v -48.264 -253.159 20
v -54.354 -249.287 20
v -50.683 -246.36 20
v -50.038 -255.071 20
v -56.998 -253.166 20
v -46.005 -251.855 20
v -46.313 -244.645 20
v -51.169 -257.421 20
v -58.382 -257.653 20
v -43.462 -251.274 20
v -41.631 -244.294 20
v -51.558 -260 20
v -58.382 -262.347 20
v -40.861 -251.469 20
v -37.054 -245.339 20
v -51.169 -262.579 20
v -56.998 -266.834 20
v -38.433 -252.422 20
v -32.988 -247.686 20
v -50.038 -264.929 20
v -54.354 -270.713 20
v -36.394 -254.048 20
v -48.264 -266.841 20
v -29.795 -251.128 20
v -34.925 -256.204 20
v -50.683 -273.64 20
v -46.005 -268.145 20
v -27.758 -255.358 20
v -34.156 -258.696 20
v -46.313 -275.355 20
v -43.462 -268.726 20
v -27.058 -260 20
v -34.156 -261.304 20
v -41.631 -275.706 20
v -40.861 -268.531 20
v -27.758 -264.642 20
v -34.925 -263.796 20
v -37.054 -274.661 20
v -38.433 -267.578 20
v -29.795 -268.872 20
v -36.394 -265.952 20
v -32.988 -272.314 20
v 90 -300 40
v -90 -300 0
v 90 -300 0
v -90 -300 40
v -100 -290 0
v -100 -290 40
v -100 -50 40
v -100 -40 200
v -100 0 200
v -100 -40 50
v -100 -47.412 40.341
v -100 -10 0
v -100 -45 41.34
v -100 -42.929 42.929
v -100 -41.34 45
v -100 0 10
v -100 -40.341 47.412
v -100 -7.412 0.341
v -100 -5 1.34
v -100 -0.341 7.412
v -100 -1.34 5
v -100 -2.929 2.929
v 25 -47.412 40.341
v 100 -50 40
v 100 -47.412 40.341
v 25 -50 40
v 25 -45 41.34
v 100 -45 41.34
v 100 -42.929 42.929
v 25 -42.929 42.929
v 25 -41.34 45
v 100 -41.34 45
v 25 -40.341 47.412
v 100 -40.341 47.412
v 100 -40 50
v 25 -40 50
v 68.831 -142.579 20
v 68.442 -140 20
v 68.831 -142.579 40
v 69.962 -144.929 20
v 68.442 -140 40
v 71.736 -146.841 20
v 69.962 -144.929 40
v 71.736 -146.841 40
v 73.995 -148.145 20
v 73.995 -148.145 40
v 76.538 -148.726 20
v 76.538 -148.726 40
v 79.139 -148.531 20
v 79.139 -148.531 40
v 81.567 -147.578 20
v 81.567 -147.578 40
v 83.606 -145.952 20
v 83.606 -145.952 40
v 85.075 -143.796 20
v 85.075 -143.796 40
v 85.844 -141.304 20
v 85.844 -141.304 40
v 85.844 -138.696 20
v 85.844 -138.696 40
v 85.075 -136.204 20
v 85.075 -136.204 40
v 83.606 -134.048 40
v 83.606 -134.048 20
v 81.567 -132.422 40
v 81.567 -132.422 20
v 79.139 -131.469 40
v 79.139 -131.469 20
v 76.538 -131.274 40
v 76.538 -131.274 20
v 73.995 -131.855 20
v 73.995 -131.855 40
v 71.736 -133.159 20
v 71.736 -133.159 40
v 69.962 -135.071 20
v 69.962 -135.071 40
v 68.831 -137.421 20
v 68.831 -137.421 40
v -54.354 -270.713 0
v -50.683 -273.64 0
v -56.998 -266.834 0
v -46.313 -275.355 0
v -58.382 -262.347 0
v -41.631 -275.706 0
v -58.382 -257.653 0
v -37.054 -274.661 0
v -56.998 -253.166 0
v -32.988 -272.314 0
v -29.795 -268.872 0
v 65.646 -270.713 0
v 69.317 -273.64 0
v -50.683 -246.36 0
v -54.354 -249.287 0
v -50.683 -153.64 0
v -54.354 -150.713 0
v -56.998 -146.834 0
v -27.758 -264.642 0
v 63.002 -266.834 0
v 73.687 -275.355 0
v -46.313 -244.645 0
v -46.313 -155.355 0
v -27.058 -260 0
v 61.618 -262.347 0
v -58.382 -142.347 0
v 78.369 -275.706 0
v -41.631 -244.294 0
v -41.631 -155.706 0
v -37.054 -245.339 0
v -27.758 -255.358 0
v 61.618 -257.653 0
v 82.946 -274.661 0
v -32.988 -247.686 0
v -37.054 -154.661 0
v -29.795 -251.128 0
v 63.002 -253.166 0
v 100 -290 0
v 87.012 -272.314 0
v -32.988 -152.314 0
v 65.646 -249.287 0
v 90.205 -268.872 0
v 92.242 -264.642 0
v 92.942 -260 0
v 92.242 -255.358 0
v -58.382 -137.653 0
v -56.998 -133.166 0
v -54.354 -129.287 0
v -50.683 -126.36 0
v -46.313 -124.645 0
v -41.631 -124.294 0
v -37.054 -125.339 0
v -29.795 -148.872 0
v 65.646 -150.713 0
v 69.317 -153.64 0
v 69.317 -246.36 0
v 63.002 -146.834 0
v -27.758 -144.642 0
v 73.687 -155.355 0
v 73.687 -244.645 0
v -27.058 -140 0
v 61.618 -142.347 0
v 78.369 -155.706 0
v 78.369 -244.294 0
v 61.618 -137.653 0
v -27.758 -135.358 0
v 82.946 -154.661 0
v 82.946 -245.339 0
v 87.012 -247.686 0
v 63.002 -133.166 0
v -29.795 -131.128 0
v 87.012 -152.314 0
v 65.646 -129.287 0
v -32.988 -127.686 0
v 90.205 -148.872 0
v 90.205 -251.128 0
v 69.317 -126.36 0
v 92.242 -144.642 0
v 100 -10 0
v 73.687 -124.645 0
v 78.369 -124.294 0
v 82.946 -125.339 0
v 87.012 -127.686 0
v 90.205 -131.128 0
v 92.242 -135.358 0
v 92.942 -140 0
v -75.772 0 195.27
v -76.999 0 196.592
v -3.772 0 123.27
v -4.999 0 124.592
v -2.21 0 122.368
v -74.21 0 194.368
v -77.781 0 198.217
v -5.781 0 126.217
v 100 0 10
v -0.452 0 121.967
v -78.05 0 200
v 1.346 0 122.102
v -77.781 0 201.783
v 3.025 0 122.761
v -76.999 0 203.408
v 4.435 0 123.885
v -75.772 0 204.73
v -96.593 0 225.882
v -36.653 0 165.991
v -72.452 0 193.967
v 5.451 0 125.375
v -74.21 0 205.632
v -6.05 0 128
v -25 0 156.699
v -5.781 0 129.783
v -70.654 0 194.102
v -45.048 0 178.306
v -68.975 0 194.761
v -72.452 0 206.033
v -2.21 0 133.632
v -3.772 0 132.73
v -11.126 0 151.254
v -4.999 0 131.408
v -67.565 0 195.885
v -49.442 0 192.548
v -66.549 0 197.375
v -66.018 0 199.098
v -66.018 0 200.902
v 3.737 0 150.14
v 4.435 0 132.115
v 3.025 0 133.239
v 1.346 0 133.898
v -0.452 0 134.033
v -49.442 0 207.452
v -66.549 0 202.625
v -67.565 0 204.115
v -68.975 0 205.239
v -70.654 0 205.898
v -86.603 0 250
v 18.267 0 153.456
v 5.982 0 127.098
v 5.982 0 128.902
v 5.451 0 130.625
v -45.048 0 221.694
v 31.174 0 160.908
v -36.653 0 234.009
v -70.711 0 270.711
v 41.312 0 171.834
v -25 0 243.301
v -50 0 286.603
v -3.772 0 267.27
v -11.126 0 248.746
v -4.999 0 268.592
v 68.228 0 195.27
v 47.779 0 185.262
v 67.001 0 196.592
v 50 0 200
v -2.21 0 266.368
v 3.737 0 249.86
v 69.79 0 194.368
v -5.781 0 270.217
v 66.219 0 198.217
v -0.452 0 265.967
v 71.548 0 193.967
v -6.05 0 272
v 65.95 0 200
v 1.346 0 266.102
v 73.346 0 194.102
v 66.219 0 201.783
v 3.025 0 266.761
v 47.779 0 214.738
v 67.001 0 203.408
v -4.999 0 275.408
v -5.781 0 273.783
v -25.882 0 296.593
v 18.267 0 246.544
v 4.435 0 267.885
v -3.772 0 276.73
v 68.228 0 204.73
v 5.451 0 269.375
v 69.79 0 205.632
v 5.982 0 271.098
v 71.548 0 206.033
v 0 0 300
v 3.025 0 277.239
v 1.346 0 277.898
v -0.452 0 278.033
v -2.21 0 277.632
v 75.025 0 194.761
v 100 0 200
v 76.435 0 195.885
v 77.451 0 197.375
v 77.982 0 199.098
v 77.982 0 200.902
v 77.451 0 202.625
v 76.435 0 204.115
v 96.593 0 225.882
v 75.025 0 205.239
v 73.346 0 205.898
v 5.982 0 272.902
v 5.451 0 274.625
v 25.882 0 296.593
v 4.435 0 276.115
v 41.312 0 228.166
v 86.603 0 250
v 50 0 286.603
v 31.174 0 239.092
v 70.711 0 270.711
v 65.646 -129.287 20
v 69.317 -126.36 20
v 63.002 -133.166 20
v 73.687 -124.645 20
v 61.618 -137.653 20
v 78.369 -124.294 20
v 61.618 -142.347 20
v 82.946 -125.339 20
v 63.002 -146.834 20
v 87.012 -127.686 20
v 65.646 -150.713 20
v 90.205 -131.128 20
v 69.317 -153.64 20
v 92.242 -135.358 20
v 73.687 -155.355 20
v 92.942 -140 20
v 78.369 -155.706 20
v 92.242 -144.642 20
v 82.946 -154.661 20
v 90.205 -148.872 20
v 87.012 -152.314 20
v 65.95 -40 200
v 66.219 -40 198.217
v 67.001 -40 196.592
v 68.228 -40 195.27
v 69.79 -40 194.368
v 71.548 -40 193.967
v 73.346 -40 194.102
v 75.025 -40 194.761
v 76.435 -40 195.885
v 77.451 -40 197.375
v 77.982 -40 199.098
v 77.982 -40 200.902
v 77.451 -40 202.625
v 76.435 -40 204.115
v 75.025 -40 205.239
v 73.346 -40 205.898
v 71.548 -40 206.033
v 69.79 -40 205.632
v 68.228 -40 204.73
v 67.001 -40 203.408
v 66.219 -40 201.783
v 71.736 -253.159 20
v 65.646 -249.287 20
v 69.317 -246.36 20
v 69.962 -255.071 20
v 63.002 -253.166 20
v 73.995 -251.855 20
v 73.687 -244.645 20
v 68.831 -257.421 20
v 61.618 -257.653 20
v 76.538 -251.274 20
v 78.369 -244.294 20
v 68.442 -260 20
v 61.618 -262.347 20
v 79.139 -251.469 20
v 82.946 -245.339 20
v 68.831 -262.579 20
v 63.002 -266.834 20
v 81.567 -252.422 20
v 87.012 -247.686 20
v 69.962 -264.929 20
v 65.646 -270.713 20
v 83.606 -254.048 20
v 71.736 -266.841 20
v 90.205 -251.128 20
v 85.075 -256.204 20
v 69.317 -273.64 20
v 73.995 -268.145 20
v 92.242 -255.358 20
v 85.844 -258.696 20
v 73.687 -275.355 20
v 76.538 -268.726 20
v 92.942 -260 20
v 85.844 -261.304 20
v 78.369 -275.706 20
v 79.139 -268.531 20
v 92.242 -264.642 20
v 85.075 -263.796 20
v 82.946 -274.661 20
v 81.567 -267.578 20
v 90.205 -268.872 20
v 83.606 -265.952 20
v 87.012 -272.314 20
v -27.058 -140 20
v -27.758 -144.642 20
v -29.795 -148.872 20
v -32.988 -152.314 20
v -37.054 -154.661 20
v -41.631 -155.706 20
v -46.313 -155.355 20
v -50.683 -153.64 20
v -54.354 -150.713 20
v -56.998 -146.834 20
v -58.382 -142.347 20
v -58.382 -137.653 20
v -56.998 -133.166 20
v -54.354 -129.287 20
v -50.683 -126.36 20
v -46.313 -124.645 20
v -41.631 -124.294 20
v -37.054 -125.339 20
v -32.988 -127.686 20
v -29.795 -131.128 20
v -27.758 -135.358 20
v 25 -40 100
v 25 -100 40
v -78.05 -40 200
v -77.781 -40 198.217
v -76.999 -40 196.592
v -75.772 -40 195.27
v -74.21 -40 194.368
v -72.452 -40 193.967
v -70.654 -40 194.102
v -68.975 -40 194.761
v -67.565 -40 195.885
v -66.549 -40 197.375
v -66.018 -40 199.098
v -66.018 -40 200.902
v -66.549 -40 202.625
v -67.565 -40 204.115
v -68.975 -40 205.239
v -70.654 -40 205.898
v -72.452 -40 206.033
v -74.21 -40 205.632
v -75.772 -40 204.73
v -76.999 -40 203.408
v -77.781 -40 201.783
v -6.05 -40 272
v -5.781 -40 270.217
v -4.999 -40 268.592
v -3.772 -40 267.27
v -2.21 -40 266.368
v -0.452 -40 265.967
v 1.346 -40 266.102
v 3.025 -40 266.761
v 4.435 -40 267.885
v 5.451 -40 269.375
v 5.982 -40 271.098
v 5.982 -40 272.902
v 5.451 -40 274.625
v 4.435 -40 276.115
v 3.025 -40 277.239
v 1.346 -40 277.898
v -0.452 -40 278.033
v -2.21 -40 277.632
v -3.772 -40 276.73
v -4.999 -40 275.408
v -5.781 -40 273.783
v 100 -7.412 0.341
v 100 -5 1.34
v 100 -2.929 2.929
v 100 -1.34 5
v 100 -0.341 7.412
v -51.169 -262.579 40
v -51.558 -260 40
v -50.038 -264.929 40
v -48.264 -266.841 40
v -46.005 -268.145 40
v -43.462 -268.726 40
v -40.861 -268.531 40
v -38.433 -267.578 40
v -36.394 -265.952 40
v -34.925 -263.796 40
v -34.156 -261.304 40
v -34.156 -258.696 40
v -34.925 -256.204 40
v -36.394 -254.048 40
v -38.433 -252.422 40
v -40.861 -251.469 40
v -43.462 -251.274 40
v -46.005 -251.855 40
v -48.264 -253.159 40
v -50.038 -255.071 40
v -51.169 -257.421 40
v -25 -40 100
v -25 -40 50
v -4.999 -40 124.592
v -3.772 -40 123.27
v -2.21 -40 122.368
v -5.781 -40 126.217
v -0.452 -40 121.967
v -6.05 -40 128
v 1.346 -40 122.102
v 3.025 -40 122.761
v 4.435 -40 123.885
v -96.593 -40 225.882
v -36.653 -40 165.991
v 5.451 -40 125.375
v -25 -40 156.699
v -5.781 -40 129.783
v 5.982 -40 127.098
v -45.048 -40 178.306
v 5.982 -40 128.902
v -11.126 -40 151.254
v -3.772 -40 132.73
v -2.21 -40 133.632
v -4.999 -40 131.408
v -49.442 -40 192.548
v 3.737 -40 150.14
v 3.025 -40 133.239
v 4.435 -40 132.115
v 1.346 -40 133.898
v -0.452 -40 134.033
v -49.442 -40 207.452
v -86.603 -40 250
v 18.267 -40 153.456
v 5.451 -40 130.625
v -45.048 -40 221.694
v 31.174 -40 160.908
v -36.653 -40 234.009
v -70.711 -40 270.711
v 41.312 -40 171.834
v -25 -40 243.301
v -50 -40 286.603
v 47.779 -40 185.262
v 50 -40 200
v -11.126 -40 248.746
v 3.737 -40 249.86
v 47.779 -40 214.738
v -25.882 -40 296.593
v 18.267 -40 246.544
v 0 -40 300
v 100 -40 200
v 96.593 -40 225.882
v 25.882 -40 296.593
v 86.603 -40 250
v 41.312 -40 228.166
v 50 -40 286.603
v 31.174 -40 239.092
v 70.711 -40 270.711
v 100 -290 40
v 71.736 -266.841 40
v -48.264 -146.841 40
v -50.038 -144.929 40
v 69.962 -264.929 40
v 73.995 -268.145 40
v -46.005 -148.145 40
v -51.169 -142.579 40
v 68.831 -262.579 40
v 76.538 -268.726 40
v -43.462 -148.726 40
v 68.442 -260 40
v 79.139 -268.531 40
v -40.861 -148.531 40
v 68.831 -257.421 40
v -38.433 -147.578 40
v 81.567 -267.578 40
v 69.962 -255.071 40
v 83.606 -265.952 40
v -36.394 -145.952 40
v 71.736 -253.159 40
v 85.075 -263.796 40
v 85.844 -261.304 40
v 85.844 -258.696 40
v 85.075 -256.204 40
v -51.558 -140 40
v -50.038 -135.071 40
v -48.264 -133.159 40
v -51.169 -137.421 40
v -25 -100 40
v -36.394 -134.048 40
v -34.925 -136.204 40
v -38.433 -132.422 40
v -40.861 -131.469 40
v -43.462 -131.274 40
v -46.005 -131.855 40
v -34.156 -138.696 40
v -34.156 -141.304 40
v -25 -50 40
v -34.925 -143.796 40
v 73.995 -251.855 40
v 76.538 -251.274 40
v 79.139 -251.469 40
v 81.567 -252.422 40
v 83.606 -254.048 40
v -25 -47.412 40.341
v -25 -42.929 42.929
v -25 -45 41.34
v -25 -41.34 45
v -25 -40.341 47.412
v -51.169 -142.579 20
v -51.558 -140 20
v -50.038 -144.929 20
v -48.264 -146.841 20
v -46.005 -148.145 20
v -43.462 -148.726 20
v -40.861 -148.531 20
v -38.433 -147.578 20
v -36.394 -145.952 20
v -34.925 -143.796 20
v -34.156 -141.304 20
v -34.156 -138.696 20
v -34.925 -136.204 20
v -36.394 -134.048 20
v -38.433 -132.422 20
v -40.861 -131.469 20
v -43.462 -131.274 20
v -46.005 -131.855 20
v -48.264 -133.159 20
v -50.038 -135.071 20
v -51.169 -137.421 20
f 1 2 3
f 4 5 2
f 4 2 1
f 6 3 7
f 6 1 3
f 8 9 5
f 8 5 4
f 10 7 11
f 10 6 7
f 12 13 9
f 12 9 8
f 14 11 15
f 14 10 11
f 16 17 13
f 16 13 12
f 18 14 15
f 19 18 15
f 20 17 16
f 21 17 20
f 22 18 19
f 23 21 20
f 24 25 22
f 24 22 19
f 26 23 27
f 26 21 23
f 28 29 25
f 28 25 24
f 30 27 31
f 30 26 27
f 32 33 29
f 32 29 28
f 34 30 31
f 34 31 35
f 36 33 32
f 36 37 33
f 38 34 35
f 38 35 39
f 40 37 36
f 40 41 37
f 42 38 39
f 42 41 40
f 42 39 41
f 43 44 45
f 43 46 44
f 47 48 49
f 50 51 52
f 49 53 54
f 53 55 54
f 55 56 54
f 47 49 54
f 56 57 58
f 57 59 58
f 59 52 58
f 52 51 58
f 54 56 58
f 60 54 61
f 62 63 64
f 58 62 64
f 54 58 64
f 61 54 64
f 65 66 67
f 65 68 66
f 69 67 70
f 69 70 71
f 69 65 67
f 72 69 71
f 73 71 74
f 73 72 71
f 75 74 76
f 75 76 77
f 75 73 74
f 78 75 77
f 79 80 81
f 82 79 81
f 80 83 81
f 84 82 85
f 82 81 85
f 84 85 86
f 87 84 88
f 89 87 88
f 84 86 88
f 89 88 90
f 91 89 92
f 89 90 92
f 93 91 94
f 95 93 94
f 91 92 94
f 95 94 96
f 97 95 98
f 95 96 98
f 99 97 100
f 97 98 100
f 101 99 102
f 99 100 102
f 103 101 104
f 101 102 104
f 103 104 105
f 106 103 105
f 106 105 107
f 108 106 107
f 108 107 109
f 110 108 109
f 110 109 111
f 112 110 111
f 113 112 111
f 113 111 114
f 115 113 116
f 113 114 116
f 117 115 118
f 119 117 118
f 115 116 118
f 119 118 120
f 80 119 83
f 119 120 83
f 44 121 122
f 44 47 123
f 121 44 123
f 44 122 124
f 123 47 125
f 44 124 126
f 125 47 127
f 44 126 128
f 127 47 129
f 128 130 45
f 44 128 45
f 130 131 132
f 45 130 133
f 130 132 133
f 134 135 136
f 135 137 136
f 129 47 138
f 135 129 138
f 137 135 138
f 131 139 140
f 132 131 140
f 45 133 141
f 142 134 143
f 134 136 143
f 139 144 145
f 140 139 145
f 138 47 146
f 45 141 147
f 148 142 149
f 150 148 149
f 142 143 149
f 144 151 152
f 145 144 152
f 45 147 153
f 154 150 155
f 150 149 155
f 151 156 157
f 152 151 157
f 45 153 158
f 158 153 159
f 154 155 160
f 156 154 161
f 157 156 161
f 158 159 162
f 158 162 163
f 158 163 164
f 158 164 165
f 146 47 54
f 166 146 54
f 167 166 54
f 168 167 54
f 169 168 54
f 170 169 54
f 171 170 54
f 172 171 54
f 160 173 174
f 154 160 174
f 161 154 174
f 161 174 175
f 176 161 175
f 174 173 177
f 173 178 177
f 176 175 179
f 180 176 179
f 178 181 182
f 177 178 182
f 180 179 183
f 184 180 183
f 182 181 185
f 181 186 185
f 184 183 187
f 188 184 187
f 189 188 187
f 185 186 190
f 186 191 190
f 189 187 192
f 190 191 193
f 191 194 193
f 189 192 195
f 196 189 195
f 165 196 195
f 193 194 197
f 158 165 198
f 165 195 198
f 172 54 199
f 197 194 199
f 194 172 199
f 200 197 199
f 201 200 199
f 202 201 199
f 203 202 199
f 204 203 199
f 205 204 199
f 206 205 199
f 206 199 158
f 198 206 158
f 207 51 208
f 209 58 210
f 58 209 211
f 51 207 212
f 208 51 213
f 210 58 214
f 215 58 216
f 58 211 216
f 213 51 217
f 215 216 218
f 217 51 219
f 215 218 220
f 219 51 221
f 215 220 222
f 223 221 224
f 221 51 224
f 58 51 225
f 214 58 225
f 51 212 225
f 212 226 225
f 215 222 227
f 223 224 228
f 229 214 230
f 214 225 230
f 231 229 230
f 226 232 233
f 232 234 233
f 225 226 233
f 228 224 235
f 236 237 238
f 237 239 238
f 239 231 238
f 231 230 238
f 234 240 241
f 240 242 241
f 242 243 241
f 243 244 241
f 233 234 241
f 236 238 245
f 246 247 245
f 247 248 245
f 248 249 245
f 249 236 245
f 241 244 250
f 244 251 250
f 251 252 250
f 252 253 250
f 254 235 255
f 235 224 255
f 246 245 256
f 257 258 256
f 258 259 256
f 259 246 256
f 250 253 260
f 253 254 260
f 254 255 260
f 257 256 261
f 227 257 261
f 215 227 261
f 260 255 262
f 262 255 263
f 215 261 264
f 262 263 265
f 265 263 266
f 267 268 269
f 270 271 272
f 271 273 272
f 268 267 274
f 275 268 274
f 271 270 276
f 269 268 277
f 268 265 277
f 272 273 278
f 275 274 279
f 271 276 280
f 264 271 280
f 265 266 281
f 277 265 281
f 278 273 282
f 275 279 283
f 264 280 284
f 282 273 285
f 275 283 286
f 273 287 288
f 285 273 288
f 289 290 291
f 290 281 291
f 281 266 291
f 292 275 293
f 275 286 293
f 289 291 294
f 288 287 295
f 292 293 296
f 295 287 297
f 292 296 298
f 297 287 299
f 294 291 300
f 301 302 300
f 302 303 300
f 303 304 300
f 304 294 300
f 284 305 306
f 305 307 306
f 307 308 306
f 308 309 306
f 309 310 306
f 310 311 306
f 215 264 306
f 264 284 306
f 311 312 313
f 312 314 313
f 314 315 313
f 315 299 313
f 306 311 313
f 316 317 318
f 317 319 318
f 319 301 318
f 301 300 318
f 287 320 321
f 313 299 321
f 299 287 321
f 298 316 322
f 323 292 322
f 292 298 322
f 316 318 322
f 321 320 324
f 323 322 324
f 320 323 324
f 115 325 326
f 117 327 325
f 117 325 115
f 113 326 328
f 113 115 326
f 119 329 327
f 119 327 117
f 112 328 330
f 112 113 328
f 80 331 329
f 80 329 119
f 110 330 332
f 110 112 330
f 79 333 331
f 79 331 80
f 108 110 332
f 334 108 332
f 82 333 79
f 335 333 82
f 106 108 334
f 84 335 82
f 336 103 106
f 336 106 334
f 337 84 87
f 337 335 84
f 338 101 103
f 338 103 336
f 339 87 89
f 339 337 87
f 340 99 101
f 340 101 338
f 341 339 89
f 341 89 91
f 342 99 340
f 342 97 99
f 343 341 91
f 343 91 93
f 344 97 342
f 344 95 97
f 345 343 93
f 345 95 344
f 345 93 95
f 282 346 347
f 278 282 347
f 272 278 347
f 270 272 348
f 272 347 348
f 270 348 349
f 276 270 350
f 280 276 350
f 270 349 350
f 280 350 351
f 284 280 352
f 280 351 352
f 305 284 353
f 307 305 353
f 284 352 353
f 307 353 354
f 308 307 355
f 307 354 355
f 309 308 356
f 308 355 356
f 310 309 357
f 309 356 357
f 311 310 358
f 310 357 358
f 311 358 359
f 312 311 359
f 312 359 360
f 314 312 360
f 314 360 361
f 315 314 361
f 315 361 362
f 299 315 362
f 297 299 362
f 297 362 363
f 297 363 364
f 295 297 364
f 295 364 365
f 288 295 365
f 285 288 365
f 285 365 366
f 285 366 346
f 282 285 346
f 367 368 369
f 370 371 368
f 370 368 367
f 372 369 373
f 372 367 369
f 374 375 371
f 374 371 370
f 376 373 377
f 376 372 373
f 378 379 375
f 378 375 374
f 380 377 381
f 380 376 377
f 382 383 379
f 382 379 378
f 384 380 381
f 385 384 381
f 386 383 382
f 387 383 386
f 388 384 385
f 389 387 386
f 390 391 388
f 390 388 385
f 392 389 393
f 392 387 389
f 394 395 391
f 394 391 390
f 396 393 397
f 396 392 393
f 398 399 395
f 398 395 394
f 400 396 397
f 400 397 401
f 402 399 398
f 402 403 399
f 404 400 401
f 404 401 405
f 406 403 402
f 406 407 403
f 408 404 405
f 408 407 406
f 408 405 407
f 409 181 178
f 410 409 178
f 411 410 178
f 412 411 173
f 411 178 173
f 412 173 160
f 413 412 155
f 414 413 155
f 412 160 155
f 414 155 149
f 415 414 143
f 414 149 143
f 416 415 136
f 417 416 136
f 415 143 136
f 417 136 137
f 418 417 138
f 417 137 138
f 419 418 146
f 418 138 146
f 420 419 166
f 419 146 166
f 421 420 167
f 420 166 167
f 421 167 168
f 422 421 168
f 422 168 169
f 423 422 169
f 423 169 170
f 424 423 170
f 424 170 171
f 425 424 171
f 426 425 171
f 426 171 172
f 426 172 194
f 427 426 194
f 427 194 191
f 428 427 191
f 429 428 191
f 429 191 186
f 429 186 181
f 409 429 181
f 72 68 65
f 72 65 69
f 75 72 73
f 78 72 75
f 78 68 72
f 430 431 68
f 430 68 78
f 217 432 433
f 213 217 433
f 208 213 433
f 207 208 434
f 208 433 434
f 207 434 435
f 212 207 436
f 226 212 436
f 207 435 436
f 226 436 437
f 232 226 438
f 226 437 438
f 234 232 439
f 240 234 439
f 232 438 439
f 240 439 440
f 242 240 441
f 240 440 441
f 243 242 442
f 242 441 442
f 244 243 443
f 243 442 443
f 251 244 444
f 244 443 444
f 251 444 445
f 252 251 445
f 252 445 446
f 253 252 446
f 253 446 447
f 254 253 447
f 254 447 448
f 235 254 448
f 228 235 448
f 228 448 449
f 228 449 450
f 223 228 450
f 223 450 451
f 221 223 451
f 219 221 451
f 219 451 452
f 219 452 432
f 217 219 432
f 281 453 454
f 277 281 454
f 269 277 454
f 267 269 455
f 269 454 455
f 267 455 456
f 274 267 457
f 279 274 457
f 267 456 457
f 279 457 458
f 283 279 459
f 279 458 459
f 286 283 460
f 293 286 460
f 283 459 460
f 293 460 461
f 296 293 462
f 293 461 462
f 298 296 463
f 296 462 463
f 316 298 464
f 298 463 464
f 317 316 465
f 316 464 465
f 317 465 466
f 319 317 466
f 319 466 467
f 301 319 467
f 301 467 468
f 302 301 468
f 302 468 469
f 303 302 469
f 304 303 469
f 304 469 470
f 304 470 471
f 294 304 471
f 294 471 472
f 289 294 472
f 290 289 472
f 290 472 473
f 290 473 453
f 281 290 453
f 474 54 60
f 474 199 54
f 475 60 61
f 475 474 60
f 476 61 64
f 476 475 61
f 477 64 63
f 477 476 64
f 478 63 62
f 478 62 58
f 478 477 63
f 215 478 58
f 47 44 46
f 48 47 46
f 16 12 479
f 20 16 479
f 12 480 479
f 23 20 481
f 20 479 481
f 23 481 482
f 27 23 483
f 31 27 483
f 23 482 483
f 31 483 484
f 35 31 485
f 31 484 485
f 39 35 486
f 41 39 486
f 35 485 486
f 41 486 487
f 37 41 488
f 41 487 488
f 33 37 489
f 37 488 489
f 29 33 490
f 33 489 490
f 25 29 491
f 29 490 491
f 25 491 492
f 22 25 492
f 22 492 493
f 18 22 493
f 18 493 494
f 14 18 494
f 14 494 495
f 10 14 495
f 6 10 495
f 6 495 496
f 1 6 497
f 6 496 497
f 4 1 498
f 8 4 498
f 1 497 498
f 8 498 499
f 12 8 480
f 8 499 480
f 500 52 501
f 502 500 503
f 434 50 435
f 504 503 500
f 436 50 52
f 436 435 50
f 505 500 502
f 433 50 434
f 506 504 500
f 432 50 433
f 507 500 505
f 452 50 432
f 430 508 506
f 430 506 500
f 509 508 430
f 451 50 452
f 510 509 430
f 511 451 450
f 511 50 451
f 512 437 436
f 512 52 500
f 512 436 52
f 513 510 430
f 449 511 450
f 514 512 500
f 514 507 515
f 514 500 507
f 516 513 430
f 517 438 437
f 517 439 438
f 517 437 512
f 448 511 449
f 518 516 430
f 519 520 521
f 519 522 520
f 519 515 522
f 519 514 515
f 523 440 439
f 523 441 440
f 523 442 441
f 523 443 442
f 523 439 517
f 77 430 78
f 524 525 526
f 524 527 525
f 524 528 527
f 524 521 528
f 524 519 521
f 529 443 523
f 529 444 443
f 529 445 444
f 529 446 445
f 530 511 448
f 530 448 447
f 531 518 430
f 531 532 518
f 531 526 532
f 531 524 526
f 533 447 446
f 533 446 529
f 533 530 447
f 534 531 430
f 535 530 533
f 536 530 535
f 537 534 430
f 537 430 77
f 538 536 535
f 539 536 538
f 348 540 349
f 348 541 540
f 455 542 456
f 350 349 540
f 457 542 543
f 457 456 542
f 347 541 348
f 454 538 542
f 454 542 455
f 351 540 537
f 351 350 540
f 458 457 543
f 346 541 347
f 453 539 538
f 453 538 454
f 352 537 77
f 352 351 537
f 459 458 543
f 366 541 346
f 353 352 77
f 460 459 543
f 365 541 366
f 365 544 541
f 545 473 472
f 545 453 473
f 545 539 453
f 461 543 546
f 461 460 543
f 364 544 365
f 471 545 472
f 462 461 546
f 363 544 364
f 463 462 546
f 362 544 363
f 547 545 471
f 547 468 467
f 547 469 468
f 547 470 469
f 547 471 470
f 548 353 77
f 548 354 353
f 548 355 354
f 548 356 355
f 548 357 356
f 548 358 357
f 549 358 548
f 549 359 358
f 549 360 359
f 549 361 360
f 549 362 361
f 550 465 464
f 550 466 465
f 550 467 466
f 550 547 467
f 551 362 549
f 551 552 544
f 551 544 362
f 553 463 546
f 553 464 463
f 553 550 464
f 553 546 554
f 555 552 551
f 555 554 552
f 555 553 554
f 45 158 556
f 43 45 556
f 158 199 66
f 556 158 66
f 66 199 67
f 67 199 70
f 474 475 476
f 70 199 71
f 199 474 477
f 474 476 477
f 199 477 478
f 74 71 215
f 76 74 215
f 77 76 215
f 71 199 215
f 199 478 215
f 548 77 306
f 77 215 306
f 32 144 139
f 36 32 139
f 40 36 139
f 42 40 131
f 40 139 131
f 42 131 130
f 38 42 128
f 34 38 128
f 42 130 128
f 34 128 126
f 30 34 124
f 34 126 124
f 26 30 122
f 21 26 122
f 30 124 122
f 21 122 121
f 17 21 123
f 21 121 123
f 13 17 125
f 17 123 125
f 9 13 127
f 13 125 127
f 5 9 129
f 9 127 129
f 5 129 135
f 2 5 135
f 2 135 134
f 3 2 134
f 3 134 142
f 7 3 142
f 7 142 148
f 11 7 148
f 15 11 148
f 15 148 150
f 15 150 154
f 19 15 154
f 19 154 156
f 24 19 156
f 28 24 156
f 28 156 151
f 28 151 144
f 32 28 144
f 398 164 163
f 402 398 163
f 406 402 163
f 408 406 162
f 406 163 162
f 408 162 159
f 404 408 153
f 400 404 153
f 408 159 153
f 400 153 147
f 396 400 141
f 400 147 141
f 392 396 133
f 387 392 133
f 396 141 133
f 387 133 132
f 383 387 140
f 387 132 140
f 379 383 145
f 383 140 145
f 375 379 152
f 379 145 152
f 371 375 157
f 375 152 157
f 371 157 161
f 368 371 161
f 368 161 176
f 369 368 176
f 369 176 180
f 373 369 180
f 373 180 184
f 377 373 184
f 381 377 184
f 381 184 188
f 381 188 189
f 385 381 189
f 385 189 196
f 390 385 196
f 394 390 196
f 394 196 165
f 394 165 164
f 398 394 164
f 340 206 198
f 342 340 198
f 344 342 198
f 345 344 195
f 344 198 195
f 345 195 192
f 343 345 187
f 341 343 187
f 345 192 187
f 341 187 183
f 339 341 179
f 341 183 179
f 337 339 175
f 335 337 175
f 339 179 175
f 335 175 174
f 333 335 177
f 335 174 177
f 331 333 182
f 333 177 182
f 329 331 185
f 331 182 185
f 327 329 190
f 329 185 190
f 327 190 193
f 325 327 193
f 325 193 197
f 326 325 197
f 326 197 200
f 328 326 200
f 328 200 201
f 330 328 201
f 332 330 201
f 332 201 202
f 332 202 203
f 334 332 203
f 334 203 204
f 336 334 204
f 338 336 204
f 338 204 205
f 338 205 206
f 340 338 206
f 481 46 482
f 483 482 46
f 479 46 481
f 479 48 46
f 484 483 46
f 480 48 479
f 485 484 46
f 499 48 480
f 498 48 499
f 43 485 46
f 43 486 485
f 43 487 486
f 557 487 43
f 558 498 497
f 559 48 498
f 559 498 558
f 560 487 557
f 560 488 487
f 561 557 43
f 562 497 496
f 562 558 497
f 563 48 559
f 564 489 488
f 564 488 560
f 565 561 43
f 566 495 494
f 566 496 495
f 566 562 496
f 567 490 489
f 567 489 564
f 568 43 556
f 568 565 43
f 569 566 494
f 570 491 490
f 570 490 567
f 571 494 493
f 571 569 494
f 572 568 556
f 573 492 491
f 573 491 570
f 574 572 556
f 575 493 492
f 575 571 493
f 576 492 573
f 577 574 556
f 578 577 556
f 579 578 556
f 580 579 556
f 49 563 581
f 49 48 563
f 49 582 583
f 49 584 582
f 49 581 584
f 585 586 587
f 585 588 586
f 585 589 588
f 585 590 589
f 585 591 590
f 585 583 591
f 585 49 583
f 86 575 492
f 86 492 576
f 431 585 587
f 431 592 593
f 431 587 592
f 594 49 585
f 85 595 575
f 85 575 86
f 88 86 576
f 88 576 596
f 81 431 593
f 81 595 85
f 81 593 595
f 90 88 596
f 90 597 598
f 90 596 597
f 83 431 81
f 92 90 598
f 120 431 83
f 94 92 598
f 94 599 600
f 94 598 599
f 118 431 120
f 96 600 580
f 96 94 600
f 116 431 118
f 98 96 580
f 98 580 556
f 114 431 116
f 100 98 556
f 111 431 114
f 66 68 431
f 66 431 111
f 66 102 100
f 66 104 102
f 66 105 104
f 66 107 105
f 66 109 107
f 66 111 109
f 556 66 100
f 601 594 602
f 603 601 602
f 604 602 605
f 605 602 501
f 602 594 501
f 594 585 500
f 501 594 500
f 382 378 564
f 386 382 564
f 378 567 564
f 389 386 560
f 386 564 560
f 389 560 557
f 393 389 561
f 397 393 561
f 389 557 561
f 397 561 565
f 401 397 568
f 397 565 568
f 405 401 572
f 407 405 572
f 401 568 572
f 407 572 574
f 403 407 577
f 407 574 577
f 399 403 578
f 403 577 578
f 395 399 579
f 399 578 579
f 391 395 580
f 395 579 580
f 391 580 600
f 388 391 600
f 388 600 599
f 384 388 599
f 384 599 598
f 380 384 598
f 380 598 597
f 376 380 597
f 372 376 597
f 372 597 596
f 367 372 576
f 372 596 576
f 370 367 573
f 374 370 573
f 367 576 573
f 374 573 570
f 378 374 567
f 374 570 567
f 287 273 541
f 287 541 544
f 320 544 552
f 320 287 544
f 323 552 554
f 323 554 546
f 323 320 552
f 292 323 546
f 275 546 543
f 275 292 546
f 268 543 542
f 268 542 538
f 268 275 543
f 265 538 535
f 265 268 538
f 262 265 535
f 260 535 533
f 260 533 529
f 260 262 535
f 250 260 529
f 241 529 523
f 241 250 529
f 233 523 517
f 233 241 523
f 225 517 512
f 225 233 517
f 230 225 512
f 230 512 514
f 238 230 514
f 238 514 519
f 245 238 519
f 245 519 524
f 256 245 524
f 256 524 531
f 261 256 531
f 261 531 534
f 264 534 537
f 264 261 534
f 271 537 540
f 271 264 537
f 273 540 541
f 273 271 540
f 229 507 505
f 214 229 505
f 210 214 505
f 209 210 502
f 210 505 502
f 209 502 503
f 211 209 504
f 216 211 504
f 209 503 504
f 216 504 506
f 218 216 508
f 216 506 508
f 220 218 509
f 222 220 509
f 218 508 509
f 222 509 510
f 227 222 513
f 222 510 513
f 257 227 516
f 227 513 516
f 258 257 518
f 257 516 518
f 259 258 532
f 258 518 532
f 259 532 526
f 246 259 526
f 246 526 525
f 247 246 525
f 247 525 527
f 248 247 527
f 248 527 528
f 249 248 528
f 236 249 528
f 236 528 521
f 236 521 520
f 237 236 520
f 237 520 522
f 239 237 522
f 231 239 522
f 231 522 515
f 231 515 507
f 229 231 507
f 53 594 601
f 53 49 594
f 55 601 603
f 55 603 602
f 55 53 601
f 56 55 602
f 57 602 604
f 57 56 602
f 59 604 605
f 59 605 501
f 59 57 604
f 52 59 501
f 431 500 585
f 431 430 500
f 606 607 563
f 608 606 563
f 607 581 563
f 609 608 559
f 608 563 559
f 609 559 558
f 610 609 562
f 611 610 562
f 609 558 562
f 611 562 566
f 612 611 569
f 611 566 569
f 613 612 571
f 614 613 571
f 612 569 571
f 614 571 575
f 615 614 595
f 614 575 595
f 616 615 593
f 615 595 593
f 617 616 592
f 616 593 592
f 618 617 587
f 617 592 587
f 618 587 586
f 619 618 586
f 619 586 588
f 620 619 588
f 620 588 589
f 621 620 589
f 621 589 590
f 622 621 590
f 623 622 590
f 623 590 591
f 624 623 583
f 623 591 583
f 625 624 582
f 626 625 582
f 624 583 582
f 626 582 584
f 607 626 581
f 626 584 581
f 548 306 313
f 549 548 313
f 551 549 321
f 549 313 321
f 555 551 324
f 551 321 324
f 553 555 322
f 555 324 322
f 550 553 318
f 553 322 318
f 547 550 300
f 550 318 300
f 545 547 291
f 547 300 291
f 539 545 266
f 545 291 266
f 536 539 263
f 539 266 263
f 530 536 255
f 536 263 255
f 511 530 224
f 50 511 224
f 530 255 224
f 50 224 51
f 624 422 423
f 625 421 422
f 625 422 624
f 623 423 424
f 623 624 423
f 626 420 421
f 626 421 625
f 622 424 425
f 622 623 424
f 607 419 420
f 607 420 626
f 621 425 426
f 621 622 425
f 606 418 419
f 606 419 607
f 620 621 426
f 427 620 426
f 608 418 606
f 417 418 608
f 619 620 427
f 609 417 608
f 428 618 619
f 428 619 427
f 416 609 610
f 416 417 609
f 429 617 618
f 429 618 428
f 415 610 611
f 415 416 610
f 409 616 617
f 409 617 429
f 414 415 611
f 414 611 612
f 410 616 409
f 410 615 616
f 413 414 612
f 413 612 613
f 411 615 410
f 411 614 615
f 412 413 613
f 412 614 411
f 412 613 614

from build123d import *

# Parameters (mm, degrees)
F0_W           = 200
F0_H           = 40
F0_R           = 7
F0_R_2         = 50
F1_DEPTH       = 40
F2_D           = 12.1
F3_DEPTH       = 300
F5_DEPTH       = 25
F7_SIZE        = 10
F8_R           = 10
F9_D           = 17.5
F9_CBORE_D     = 31.5
F9_CBORE_DEPTH = 20


with BuildPart() as f1:
    # F0 (on Front) → F1 (new body)
    with BuildSketch(Plane.XZ):
        with Locations((0, 20)):
            Rectangle(F0_W, F0_H)
        with BuildLine():
            Line((-100, 200), (-100, 40))
            Line((-100, 40), (100, 40))
            Line((100, 40), (100, 200))
            ThreePointArc((100, 200), (0, 300), (-100, 200))
        make_face()
        with Locations((0, 128)):
            Circle(F0_R, mode=Mode.SUBTRACT)
        with Locations((-72, 200)):
            Circle(F0_R, mode=Mode.SUBTRACT)
        with Locations((0, 200)):
            Circle(F0_R_2, mode=Mode.SUBTRACT)
        with Locations((72, 200)):
            Circle(F0_R, mode=Mode.SUBTRACT)
        with Locations((0, 272)):
            Circle(F0_R, mode=Mode.SUBTRACT)
        with Locations((-72, 200)):
            Circle(F0_R)
        with Locations((0, 272)):
            Circle(F0_R)
        with Locations((72, 200)):
            Circle(F0_R)
        with Locations((0, 128)):
            Circle(F0_R)
    extrude(amount=F1_DEPTH)

    # F2 (through all)
    with Locations(Plane(origin=(0, 0, 0), x_dir=(1, 0, 0), z_dir=(0, 1, 0))):
        with Locations((0, -272), (72, -200), (0, -128), (-72, -200)):
            Hole(F2_D / 2)

    # F0 (on Front) → F3 (join)
    with BuildSketch(Plane.XZ):
        with Locations((0, 20)):
            Rectangle(F0_W, F0_H)
    extrude(amount=F3_DEPTH)

    # F4 (on Right) → F5 (join, symmetric)
    with BuildSketch(Plane.YZ):
        Polygon((-100, 40), (-40, 40), (-40, 100), align=None)
    extrude(amount=F5_DEPTH, both=True)

    # F7
    f7_edges = [f1.edges().sort_by_distance(p)[0] for p in [
        (-100, -300, 20),
        (100, -300, 20),
    ]]
    chamfer(f7_edges, length=F7_SIZE)

    # F8
    f8_edges = [f1.edges().sort_by_distance(p)[0] for p in [
        (-62.5, -40, 40),
        (62.5, -40, 40),
        (0, 0, 0),
    ]]
    fillet(f8_edges, radius=F8_R)

    # F9 (through all)
    with Locations(Plane(origin=(0, 0, 0), x_dir=(1, 0, 0), z_dir=(0, 0, -1))):
        with Locations((-42.8080064058, 260), (77.1919935942, 260), (77.1919935942, 140), (-42.8080064058, 140)):
            CounterBoreHole(F9_D / 2, F9_CBORE_D / 2, F9_CBORE_DEPTH)


solid = f1.part
